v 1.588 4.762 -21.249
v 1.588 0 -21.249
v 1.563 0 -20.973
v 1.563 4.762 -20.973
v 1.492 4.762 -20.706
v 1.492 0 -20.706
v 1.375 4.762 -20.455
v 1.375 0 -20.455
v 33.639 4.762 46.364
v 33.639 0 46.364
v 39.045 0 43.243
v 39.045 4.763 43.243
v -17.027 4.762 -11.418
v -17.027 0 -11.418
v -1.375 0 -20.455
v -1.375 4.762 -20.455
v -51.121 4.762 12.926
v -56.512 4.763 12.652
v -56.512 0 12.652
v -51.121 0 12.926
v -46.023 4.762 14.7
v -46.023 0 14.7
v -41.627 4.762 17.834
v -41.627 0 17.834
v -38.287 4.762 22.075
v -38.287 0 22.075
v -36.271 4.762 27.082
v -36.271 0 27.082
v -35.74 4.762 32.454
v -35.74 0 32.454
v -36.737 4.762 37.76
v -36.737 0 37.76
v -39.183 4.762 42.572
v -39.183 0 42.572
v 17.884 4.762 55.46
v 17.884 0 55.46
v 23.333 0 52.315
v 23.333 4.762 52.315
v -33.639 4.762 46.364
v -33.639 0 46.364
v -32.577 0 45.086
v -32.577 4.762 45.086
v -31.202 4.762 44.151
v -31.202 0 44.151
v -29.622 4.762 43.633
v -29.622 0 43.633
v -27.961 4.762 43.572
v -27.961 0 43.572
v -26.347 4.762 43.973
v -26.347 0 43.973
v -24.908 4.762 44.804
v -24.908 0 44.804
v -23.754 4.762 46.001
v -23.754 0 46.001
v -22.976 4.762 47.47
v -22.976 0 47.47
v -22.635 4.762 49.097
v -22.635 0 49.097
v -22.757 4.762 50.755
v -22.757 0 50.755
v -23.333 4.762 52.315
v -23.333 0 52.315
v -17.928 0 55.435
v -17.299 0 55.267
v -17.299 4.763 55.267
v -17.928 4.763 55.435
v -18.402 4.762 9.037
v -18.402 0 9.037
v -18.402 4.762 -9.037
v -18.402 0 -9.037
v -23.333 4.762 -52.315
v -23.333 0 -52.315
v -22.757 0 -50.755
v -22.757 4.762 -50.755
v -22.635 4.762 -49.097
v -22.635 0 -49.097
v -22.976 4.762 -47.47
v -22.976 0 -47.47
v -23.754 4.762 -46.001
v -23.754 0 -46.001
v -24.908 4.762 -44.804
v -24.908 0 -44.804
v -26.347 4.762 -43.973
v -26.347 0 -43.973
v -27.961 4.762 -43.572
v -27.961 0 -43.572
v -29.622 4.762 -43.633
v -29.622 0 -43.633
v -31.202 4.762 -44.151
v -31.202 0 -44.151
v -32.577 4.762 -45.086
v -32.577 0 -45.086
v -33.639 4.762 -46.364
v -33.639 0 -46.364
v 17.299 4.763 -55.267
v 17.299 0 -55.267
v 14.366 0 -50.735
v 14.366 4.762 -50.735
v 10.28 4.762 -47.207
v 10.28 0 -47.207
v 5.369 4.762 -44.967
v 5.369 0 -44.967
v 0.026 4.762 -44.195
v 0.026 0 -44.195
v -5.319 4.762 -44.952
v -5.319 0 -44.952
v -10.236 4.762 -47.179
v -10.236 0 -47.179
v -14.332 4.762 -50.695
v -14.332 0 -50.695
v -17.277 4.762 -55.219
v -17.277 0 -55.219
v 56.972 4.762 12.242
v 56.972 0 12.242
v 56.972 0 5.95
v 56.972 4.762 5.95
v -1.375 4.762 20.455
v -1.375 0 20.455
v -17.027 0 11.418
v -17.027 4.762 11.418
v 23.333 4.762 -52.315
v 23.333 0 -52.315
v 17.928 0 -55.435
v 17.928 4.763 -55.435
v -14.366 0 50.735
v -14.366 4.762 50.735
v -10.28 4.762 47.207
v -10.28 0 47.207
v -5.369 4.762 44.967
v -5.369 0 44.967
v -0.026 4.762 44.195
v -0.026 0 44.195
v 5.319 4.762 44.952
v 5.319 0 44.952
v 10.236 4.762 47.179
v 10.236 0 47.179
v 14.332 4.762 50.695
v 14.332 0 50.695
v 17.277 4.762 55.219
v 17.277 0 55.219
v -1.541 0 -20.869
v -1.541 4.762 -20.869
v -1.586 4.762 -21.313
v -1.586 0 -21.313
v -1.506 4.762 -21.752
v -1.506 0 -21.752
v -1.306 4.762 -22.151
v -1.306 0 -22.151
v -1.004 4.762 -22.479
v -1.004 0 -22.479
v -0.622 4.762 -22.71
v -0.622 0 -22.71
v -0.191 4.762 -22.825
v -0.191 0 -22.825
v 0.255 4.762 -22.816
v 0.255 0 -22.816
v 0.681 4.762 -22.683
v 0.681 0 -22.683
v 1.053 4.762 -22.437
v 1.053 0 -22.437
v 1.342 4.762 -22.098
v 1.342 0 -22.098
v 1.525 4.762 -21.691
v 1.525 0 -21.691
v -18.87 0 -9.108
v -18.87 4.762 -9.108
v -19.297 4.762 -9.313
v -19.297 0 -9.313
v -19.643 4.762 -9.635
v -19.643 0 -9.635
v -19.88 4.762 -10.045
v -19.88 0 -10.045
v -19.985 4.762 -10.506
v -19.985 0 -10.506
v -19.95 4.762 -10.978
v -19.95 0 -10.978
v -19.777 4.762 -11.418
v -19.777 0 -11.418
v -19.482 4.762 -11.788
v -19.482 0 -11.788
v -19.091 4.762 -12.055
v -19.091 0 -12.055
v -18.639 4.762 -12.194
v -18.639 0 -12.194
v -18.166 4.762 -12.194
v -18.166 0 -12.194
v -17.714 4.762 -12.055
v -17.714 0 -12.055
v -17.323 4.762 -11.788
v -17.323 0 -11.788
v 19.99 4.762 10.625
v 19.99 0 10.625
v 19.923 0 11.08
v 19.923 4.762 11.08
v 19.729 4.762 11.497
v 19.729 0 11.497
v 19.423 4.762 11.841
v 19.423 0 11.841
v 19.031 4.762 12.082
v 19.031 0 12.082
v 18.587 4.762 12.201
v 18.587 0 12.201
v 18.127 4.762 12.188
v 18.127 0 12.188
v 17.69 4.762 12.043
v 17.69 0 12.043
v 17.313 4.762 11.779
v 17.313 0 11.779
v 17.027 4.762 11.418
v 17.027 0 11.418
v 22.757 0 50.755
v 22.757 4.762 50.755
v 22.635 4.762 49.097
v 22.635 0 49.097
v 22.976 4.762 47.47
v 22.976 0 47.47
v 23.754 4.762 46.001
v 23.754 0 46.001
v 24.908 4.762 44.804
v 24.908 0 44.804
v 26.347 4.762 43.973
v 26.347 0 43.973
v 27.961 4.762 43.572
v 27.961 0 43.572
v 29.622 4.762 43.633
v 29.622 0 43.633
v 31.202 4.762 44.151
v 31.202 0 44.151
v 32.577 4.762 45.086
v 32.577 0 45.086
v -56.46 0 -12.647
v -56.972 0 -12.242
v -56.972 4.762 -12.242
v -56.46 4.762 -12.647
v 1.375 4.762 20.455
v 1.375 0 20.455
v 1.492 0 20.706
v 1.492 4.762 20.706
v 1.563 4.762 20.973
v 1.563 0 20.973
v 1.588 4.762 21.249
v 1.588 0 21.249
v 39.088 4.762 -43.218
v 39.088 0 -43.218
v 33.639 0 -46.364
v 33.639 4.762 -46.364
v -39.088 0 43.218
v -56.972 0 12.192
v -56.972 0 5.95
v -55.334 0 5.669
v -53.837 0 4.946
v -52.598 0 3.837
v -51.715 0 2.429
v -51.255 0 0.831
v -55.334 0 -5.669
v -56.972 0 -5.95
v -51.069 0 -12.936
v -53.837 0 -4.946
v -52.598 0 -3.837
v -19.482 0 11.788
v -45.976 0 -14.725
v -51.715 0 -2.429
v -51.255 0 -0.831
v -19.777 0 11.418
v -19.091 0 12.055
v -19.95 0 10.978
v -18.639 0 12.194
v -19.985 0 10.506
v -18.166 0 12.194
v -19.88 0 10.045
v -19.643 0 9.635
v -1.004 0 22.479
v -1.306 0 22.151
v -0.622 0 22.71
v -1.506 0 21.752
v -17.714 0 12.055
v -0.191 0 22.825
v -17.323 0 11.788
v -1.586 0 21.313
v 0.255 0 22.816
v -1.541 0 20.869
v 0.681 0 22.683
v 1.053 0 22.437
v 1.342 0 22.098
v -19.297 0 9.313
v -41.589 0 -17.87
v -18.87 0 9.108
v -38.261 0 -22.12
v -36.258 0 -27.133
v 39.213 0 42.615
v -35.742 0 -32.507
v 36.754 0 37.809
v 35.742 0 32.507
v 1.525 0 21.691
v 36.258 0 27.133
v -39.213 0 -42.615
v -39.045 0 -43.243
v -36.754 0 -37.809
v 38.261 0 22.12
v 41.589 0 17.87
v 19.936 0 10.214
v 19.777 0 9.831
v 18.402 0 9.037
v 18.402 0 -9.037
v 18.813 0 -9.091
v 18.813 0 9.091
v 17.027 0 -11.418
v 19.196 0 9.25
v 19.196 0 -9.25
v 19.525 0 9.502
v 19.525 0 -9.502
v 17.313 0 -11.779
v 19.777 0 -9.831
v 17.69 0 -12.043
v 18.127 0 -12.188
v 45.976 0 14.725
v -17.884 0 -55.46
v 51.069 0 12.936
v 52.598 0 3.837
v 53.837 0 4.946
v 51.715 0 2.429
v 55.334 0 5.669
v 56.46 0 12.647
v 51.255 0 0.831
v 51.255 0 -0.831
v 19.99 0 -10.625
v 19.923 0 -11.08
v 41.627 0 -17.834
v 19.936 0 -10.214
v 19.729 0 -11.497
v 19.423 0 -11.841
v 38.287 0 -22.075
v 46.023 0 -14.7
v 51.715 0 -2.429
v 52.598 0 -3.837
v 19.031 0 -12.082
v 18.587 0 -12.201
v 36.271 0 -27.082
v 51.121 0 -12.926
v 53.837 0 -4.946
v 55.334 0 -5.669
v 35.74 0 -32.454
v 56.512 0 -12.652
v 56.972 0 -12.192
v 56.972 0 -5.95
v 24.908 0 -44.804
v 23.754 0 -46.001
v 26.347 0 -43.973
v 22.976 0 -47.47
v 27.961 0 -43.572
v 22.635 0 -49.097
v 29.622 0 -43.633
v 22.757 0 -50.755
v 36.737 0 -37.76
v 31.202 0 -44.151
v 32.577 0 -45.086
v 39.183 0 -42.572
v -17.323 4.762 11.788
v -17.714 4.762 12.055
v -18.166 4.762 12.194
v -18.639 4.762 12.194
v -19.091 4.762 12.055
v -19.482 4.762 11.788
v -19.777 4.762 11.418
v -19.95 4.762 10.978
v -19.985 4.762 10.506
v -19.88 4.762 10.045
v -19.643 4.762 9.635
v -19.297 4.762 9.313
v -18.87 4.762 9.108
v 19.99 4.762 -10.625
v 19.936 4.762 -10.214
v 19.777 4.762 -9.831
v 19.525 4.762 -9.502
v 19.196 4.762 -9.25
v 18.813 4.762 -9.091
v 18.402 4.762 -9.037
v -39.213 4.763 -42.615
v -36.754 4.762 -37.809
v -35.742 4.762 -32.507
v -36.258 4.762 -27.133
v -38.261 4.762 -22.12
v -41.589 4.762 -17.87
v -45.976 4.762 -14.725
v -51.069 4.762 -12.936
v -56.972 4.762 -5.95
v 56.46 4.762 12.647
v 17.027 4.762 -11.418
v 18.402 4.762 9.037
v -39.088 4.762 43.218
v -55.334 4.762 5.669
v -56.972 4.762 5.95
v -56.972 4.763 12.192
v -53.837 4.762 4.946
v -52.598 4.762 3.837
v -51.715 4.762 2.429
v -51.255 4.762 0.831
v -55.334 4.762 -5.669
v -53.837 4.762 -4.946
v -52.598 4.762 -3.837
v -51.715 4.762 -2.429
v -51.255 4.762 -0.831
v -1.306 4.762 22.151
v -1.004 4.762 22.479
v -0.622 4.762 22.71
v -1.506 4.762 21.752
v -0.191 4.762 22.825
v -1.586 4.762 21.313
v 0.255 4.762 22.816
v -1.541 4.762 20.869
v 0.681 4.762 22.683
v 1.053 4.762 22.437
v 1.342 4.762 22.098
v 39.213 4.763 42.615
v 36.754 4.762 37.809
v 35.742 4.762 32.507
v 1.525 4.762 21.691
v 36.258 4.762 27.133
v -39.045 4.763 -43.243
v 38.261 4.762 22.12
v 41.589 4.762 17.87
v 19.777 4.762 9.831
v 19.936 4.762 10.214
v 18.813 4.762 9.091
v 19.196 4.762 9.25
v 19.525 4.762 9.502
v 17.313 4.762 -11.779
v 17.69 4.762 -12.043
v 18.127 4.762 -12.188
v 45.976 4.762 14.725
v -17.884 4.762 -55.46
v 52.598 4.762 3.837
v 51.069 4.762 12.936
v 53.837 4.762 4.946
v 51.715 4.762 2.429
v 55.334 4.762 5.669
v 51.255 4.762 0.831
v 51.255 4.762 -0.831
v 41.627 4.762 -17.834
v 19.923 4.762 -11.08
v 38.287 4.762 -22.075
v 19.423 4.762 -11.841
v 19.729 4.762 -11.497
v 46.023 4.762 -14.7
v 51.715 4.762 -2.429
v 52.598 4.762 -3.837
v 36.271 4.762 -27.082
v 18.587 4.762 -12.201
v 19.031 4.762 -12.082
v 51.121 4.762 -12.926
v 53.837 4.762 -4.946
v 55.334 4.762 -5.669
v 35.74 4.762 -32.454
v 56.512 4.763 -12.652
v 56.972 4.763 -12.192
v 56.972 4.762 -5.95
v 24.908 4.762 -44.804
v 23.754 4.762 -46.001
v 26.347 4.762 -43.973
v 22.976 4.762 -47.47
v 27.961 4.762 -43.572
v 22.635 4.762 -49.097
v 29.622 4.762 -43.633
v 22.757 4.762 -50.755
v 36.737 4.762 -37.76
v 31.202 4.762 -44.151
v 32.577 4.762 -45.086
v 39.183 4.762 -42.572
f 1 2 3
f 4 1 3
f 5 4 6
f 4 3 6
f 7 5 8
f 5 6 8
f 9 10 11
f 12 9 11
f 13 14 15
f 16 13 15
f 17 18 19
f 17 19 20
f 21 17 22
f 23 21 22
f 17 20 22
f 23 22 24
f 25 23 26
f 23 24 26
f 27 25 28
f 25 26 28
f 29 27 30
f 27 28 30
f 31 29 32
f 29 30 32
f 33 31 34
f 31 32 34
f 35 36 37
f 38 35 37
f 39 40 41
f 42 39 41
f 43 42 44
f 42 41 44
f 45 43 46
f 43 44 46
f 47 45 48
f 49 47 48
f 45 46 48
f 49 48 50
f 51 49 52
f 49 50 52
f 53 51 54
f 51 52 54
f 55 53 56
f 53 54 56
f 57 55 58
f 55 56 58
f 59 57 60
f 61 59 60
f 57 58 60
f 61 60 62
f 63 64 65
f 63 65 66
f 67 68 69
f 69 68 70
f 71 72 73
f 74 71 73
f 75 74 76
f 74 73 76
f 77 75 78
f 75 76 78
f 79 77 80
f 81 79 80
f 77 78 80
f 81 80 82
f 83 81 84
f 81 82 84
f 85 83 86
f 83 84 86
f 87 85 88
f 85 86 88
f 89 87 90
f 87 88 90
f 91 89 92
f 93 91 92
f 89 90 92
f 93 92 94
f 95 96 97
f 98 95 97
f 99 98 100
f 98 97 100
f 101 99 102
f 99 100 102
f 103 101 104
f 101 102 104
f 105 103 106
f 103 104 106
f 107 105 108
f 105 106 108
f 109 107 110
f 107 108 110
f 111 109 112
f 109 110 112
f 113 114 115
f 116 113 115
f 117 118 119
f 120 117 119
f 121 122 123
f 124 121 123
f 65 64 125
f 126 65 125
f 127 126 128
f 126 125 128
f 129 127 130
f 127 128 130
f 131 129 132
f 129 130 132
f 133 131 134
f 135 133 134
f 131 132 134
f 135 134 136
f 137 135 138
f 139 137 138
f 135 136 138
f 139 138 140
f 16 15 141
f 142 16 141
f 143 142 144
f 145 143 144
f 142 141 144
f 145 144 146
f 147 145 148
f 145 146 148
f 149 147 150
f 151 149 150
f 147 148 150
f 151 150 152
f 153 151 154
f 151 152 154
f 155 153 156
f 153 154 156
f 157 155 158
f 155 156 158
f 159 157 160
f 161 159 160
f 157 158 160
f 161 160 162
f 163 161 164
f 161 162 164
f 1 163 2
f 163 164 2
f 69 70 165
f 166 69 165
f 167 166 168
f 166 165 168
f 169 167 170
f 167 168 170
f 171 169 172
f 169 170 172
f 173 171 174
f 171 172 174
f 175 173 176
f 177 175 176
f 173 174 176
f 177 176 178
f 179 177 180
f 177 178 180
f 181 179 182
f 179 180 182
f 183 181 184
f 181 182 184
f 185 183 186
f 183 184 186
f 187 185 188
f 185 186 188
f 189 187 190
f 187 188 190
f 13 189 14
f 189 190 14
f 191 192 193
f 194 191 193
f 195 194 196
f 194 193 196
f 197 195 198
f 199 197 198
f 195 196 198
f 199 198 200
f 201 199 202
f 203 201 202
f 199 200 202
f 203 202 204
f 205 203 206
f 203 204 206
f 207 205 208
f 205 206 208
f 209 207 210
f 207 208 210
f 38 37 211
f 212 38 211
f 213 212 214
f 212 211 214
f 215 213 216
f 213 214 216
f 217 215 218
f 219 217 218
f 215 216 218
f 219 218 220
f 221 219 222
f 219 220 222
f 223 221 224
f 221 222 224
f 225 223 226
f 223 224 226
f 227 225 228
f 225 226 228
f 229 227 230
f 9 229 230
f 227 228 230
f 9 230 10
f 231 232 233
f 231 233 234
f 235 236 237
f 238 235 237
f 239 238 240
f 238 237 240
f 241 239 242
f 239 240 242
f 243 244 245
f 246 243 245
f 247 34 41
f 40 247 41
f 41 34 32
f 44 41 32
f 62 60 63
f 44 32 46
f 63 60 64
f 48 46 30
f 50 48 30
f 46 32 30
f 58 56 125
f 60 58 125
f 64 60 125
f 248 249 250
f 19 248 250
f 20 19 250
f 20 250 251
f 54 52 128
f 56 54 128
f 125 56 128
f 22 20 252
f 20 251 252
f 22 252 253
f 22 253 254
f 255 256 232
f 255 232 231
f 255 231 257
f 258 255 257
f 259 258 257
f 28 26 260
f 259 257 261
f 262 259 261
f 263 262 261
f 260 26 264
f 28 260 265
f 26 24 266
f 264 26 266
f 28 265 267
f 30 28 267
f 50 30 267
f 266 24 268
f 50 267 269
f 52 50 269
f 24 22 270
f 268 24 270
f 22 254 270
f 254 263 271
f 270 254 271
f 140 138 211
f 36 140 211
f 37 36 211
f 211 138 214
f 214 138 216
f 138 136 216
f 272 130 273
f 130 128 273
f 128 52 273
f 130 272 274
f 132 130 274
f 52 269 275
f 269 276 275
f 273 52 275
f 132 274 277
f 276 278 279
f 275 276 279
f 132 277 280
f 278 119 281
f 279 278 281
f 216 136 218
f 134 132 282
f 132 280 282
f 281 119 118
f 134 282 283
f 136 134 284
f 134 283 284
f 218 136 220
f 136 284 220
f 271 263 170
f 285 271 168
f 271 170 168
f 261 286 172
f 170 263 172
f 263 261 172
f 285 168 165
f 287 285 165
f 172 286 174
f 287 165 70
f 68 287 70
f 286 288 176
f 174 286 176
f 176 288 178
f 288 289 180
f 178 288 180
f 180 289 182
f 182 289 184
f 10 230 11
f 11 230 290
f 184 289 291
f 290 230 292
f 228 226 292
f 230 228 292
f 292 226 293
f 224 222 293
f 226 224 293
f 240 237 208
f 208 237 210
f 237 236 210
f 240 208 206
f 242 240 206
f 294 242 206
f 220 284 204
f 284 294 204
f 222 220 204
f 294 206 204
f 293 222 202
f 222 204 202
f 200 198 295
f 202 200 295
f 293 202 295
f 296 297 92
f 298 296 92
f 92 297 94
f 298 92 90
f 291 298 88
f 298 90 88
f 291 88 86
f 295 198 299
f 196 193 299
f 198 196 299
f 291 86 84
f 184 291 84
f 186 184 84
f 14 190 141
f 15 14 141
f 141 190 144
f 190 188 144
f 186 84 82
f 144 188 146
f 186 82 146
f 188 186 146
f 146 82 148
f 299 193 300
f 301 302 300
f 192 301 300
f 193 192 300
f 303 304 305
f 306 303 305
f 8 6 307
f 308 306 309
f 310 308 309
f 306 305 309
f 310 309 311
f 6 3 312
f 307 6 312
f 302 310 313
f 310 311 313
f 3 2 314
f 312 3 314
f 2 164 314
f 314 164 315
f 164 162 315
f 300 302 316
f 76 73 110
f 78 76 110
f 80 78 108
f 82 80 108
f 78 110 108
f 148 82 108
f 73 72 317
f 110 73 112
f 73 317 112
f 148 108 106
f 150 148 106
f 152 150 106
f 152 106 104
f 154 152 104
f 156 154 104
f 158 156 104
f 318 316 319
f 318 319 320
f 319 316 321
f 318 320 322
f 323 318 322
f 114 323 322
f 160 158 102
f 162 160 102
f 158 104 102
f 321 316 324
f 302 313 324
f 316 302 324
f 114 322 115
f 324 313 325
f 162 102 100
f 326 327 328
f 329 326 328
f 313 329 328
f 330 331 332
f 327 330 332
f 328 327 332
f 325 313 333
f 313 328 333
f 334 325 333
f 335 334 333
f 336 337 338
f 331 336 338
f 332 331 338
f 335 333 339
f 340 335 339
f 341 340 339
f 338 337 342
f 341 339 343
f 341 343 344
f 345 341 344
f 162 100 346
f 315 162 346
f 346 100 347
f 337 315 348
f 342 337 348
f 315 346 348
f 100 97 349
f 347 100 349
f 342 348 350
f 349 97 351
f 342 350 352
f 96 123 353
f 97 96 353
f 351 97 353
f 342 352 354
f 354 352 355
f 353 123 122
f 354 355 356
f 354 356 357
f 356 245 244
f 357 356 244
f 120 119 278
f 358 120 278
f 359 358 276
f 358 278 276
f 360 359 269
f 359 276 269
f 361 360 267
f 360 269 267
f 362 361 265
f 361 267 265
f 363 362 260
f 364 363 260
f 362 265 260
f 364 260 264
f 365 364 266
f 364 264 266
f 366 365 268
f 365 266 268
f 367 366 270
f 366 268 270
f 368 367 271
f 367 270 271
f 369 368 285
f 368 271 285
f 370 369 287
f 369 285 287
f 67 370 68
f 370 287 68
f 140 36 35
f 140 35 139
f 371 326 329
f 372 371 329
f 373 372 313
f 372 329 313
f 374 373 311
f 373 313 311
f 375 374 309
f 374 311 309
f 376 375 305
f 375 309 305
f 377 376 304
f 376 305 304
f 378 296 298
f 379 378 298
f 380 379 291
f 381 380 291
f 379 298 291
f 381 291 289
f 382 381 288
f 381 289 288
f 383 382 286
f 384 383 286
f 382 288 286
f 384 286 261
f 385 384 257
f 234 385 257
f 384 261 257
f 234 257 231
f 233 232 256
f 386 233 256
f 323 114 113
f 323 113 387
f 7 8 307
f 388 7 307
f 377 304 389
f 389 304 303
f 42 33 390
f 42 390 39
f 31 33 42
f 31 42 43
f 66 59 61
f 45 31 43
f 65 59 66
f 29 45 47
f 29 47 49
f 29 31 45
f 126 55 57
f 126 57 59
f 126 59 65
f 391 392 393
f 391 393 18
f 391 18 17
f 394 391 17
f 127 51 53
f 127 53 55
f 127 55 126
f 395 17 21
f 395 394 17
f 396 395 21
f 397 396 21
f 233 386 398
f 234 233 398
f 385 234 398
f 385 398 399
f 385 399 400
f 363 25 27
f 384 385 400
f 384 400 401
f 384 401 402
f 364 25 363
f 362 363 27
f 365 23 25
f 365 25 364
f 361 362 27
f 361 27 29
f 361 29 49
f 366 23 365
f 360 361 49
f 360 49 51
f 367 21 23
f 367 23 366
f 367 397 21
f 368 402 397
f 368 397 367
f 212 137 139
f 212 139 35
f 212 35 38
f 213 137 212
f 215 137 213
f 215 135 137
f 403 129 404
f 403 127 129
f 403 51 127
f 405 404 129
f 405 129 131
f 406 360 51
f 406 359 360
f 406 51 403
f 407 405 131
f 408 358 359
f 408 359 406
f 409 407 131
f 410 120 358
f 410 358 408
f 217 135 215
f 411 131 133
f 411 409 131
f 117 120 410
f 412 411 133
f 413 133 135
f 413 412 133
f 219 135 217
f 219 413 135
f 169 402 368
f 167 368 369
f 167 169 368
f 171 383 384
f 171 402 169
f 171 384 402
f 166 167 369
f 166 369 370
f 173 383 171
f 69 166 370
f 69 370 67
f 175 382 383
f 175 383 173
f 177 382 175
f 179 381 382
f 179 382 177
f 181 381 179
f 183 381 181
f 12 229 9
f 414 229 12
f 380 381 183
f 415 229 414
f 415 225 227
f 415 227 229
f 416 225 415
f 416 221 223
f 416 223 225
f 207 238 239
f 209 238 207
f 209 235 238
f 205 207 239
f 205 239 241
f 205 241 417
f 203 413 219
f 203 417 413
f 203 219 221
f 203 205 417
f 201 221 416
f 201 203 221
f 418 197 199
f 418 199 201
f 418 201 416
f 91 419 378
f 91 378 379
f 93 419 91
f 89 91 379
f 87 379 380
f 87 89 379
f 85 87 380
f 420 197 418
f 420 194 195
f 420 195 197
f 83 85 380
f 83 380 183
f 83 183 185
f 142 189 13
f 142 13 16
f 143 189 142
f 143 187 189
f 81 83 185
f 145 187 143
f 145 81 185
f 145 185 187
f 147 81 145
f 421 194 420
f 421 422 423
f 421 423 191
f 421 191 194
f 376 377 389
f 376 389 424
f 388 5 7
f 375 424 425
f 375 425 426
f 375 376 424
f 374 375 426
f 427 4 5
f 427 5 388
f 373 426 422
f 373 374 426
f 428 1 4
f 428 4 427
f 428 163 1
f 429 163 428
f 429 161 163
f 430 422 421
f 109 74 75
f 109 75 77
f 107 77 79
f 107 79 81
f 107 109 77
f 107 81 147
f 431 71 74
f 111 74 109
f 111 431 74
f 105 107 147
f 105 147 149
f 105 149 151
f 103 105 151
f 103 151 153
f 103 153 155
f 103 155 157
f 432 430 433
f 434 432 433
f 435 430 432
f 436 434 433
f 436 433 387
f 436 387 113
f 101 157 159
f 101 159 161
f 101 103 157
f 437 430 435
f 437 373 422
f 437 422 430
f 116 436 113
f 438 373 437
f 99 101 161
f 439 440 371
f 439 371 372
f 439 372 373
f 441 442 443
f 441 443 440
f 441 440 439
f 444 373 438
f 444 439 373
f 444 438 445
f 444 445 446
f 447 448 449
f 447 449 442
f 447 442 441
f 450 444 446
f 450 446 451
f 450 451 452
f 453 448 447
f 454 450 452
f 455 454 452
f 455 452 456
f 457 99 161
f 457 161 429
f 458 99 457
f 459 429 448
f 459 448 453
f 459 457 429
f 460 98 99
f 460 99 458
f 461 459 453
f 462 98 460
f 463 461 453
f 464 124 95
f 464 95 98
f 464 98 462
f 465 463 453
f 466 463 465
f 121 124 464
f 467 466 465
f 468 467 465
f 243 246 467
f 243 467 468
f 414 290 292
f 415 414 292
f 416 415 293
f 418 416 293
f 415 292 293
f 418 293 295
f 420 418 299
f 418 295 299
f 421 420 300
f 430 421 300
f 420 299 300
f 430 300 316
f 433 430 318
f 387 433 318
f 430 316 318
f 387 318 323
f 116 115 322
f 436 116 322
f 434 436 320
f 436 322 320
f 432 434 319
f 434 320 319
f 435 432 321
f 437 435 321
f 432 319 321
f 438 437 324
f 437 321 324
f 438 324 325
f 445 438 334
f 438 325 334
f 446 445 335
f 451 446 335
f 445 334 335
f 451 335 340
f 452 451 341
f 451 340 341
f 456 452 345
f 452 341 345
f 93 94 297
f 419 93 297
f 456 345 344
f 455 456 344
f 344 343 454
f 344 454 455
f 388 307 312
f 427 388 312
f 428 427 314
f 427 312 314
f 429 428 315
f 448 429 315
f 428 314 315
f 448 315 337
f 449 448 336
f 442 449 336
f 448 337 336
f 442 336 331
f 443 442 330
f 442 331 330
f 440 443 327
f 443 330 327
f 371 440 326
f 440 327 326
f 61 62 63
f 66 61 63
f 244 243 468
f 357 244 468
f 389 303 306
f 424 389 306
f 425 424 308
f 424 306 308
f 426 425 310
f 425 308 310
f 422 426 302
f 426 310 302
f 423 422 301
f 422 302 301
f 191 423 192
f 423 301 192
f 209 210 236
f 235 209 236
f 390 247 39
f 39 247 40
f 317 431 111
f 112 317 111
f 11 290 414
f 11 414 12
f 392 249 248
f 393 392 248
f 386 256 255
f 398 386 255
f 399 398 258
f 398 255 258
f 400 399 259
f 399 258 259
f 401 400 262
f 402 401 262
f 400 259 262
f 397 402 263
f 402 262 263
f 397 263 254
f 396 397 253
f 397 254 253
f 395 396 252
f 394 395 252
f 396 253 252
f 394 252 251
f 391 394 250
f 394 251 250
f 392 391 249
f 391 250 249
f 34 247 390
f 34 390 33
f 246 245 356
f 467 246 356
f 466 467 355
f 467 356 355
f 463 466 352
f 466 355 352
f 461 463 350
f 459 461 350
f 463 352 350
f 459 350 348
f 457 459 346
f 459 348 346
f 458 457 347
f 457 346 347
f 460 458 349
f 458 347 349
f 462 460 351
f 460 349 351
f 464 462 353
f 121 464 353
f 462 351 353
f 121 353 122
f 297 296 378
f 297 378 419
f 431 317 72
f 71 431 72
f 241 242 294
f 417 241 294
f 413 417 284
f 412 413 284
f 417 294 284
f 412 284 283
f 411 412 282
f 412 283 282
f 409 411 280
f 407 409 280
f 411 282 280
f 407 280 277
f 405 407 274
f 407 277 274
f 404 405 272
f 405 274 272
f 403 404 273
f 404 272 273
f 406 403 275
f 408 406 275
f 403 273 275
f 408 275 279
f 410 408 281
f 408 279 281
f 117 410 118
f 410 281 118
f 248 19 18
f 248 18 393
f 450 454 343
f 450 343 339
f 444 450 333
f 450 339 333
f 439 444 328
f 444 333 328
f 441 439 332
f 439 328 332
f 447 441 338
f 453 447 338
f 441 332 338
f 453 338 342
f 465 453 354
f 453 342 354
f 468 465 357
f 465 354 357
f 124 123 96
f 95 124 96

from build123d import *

# Parameters (mm, degrees)
BOSS_EXTRUDE1_DEPTH = 4.7625
CHAMFER1_SIZE       = 0.458146619
CHAMFER1_SIZE_2     = 0.508


with BuildPart() as part:
    # Sketch1 → Boss-Extrude1 (new body)
    with BuildSketch(Plane(origin=(0, 0, 0), x_dir=(1, 0, 0), z_dir=(0, 1, 0))):
        with BuildLine():
            ThreePointArc((-39.484622628, 42.989372509), (-38.273971566, 22.097487787), (-56.9722, 12.7))
            Line((-56.9722, 12.7), (-56.9722, 5.950469261))
            ThreePointArc((-56.9722, 5.950469261), (-51.196875, 0), (-56.9722, -5.950469261))
            Line((-56.9722, -5.950469261), (-56.9722, -12.7))
            ThreePointArc((-56.9722, -12.7), (-38.273971566, -22.097487787), (-39.484622628, -42.989372509))
            Line((-39.484622628, -42.989372509), (-33.639357544, -46.364137879))
            ThreePointArc((-33.639357544, -46.364137879), (-25.5984375, -44.337794344), (-23.332842456, -52.31460714))
            Line((-23.332842456, -52.31460714), (-17.487577372, -55.689372509))
            ThreePointArc((-17.487577372, -55.689372509), (0, -44.194975573), (17.487577372, -55.689372509))
            Line((17.487577372, -55.689372509), (23.332842456, -52.31460714))
            ThreePointArc((23.332842456, -52.31460714), (25.5984375, -44.337794344), (33.639357544, -46.364137879))
            Line((33.639357544, -46.364137879), (39.484622628, -42.989372509))
            ThreePointArc((39.484622628, -42.989372509), (38.273971566, -22.097487787), (56.9722, -12.7))
            Line((56.9722, -12.7), (56.9722, -5.950469261))
            ThreePointArc((56.9722, -5.950469261), (51.196875, 0), (56.9722, 5.950469261))
            Line((56.9722, 5.950469261), (56.9722, 12.7))
            ThreePointArc((56.9722, 12.7), (38.273971566, 22.097487787), (39.484622628, 42.989372509))
            Line((39.484622628, 42.989372509), (33.639357544, 46.364137879))
            ThreePointArc((33.639357544, 46.364137879), (25.5984375, 44.337794344), (23.332842456, 52.31460714))
            Line((23.332842456, 52.31460714), (17.487577372, 55.689372509))
            ThreePointArc((17.487577372, 55.689372509), (0, 44.194975573), (-17.487577372, 55.689372509))
            Line((-17.487577372, 55.689372509), (-23.332842456, 52.31460714))
            ThreePointArc((-23.332842456, 52.31460714), (-25.5984375, 44.337794344), (-33.639357544, 46.364137879))
            Line((-33.639357544, 46.364137879), (-39.484622628, 42.989372509))
        make_face()
        with BuildLine():
            Line((1.374815329, 20.455395717), (17.027484671, 11.418322859))
            ThreePointArc((17.027484671, 11.418322859), (18.813175234, 12.157980108), (19.9898, 10.624572859))
            ThreePointArc((19.9898, 10.624572859), (19.524832015, 9.502040844), (18.4023, 9.037072859))
            Line((18.4023, 9.037072859), (18.4023, -9.037072859))
            ThreePointArc((18.4023, -9.037072859), (19.524832015, -9.502040844), (19.9898, -10.624572859))
            ThreePointArc((19.9898, -10.624572859), (18.813175234, -12.157980108), (17.027484671, -11.418322859))
            Line((17.027484671, -11.418322859), (1.374815329, -20.455395717))
            ThreePointArc((1.374815329, -20.455395717), (1.533407249, -20.838270483), (1.5875, -21.249145717))
            ThreePointArc((1.5875, -21.249145717), (-0.410875234, -22.782552967), (-1.374815329, -20.455395717))
            Line((-1.374815329, -20.455395717), (-17.027484671, -11.418322859))
            ThreePointArc((-17.027484671, -11.418322859), (-19.777115329, -11.418322859), (-18.4023, -9.037072859))
            Line((-18.4023, -9.037072859), (-18.4023, 9.037072859))
            ThreePointArc((-18.4023, 9.037072859), (-19.777115329, 11.418322859), (-17.027484671, 11.418322859))
            Line((-17.027484671, 11.418322859), (-1.374815329, 20.455395717))
            ThreePointArc((-1.374815329, 20.455395717), (-0.410875234, 22.782552967), (1.5875, 21.249145717))
            ThreePointArc((1.5875, 21.249145717), (1.533407249, 20.838270483), (1.374815329, 20.455395717))
        make_face(mode=Mode.SUBTRACT)
    extrude(amount=BOSS_EXTRUDE1_DEPTH)

    # Chamfer1
    # the kernel refuses this chamfer: 0.508, 0.458146619 mm, written as the material it takes off along each edge
    with BuildSketch(Plane(origin=(-39.484622628, -1.324398774, 42.989372509), x_dir=(0.8660254037844506, 0, 0.49999999999997935), z_dir=(0, 1, 0)), Plane(origin=(-56.9722, -1.324398774, -12.7), x_dir=(0, 0, 1), z_dir=(0, 1, 0)), Plane(origin=(-17.487577372, -1.324398774, -55.689372509), x_dir=(-0.8660254037844313, 0, 0.5000000000000127), z_dir=(0, 1, 0)), Plane(origin=(39.484622628, -1.324398774, -42.989372509), x_dir=(-0.86602540378444, 0, -0.4999999999999977), z_dir=(0, 1, 0)), Plane(origin=(56.9722, -1.324398774, 12.7), x_dir=(0, 0, -1), z_dir=(0, 1, 0)), Plane(origin=(17.487577372, -1.324398774, 55.689372509), x_dir=(0.8660254037844486, 0, -0.4999999999999827), z_dir=(0, 1, 0))) as chamfer1_piece_1:
        with BuildLine():
            Line((CHAMFER1_SIZE, 0), (0.052567717, 0.512318712))
            ThreePointArc((0.052567717, 0.512318712), (0.028757334, 0.263227837), (0, 0))
            Line((0, 0), (CHAMFER1_SIZE, 0))
        make_face()
    extrude(amount=7.411297548, mode=Mode.SUBTRACT)
    with BuildSketch(Plane(origin=(-56.9722, -1.306414958, 12.7), x_dir=(0.9946357789180702, 0, -0.10343919613011188), z_dir=(0, 1, 0)), Plane(origin=(-39.484622628, -1.306414958, -42.989372509), x_dir=(0.5868988610547448, 0, 0.8096602539909213), z_dir=(0, 1, 0)), Plane(origin=(56.9722, -1.306414958, -12.7), x_dir=(-0.9946357789180716, 0, 0.1034391961300989), z_dir=(0, 1, 0)), Plane(origin=(39.484622628, -1.306414958, 42.989372509), x_dir=(-0.5868988610547374, 0, -0.8096602539909268), z_dir=(0, 1, 0)), Plane(origin=(-17.487577372, -1.306414958, 55.689372509), x_dir=(0.40773691786333366, 0, -0.91309945012102), z_dir=(0, 1, 0))) as chamfer1_piece_2:
        with BuildLine():
            Line((0.462627791, 0), (CHAMFER1_SIZE_2 * 0.10343919613, CHAMFER1_SIZE_2 * 0.994635778918))
            Line((CHAMFER1_SIZE_2 * 0.10343919613, CHAMFER1_SIZE_2 * 0.994635778918), (0, 0))
            ThreePointArc((0, 0), (0.237719559, 0.001403335), (0.462627791, 0))
        make_face()
    extrude(amount=7.375329916, mode=Mode.SUBTRACT)
    with BuildSketch(Plane(origin=(17.487577372, -1.306414958, -55.689372509), x_dir=(0.8660254037844403, 0, 0.49999999999999717), z_dir=(0, 1, 0))) as chamfer1_piece_3:
        with BuildLine():
            Line((CHAMFER1_SIZE_2, 0), (0.047853847, -0.460146153))
            ThreePointArc((0.047853847, -0.460146153), (0.025985327, -0.236299219), (0, 0))
            Line((0, 0), (CHAMFER1_SIZE_2, 0))
        make_face()
    extrude(amount=7.375329916, mode=Mode.SUBTRACT)


solid = part.part
